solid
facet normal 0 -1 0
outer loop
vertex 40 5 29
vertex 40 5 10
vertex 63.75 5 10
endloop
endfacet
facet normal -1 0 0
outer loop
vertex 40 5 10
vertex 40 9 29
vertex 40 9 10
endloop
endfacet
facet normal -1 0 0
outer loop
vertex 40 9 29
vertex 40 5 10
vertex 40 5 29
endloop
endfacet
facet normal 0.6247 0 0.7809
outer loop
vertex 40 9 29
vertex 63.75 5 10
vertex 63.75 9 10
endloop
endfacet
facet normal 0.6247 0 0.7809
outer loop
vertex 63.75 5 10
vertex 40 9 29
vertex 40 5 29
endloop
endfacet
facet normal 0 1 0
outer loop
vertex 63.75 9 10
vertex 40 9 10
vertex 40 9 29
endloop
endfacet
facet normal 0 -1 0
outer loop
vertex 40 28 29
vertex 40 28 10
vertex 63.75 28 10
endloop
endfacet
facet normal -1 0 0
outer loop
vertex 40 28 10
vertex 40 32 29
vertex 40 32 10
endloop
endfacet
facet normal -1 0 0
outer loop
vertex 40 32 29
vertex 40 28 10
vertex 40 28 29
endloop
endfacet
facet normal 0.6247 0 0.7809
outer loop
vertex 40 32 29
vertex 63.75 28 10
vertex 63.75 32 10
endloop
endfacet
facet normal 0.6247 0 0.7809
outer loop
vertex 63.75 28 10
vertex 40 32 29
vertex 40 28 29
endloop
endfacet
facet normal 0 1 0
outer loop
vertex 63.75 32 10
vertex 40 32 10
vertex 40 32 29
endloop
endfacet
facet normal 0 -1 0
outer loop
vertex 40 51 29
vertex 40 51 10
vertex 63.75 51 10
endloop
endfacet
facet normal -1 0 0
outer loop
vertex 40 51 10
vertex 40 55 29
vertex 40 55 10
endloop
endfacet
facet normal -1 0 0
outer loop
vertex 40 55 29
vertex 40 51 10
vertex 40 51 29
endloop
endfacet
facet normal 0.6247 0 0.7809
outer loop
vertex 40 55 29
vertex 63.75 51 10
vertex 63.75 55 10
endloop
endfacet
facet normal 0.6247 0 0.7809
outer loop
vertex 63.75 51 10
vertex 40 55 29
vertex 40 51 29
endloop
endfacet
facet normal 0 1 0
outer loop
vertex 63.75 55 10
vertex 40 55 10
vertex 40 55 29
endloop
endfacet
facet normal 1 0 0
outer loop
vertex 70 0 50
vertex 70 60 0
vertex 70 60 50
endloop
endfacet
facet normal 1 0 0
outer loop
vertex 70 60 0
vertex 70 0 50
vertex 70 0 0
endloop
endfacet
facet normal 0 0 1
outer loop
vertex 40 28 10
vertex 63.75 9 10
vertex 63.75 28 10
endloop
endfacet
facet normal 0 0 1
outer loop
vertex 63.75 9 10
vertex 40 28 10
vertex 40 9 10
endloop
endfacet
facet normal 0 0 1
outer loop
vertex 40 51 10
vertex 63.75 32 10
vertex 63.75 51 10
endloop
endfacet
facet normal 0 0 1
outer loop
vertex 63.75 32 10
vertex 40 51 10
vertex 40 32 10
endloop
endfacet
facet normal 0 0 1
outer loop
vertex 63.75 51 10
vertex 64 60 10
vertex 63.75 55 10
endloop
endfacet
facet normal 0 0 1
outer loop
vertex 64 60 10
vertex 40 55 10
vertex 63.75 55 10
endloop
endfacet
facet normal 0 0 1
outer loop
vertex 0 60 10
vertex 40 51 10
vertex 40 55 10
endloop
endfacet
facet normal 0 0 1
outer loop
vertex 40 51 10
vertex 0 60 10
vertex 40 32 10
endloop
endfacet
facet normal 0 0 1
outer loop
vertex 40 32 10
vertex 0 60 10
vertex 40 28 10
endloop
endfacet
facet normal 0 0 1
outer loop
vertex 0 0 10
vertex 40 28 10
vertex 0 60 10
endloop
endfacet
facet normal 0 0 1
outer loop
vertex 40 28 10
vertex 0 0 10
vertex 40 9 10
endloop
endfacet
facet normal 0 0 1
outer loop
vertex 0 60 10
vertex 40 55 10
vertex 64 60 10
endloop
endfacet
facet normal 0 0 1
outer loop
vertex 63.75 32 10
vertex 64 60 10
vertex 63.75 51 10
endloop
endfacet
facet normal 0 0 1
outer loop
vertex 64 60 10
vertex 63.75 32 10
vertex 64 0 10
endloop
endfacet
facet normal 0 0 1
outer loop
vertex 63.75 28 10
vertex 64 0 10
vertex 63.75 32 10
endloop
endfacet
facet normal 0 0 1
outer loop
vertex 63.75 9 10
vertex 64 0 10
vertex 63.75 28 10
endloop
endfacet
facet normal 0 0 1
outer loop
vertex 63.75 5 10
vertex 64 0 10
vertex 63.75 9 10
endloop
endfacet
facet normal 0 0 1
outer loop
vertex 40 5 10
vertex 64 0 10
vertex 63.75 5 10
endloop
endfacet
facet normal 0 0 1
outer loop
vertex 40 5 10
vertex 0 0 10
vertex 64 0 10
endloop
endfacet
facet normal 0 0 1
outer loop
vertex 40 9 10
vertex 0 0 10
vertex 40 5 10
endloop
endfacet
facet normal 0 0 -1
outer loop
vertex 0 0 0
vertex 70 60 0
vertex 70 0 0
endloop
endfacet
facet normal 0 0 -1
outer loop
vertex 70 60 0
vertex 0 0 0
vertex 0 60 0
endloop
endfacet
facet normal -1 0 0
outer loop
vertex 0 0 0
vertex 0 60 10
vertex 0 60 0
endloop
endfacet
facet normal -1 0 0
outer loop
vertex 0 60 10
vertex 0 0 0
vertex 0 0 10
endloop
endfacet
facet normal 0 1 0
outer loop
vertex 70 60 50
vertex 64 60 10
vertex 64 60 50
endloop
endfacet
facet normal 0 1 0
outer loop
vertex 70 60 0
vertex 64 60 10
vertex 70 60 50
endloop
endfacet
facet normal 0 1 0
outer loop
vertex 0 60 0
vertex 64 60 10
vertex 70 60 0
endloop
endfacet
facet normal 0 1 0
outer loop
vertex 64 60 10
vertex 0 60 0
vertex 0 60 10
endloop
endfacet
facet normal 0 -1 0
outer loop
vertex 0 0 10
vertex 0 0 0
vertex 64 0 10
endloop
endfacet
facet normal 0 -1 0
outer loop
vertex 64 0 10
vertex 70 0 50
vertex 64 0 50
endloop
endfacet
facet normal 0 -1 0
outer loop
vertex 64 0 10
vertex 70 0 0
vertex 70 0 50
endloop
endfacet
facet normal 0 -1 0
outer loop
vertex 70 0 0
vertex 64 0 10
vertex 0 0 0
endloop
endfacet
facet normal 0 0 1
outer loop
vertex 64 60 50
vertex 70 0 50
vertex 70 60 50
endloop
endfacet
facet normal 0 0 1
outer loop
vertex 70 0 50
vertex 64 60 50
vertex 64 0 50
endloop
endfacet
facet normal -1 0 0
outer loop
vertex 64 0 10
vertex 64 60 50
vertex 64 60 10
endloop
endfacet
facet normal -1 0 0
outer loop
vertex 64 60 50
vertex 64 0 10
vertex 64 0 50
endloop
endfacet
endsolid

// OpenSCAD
$fn = 32;

// ----------------------------------------------------------------------
// Rib bracket: 3-gusset L bracket
// ----------------------------------------------------------------------

// --- parameters (mm) ---
base_l = 70;              // foot length, X
base_w = 60;              // foot width, Y
base_t = 10;              // foot thickness
plate_t = 6;              // upright plate thickness
plate_h = 50;             // overall height
gus_l = 24;               // gusset leg along the foot
gus_h = 20;               // gusset height
gus_t = 4;                // gusset thickness
gus_edge = 5;             // gusset margin from the foot edge
n_gus = 3;                // gusset count

gus_pitch = (base_w - 2 * gus_edge - gus_t) / (n_gus - 1);  // gusset pitch

union() {
  cube([base_l, base_w, base_t]);
  translate([base_l - plate_t, 0, base_t - 1])
    cube([plate_t, base_w, plate_h - base_t + 1]);
  for (i = [0 : n_gus - 1])
    translate([base_l - plate_t - gus_l, gus_edge + i * gus_pitch, base_t - 1])
      rotate([-90, 0, 0])
        linear_extrude(height = gus_t)
          polygon(points = [[0, 0], [gus_l + 1, 0], [0, -gus_h]]);
}
